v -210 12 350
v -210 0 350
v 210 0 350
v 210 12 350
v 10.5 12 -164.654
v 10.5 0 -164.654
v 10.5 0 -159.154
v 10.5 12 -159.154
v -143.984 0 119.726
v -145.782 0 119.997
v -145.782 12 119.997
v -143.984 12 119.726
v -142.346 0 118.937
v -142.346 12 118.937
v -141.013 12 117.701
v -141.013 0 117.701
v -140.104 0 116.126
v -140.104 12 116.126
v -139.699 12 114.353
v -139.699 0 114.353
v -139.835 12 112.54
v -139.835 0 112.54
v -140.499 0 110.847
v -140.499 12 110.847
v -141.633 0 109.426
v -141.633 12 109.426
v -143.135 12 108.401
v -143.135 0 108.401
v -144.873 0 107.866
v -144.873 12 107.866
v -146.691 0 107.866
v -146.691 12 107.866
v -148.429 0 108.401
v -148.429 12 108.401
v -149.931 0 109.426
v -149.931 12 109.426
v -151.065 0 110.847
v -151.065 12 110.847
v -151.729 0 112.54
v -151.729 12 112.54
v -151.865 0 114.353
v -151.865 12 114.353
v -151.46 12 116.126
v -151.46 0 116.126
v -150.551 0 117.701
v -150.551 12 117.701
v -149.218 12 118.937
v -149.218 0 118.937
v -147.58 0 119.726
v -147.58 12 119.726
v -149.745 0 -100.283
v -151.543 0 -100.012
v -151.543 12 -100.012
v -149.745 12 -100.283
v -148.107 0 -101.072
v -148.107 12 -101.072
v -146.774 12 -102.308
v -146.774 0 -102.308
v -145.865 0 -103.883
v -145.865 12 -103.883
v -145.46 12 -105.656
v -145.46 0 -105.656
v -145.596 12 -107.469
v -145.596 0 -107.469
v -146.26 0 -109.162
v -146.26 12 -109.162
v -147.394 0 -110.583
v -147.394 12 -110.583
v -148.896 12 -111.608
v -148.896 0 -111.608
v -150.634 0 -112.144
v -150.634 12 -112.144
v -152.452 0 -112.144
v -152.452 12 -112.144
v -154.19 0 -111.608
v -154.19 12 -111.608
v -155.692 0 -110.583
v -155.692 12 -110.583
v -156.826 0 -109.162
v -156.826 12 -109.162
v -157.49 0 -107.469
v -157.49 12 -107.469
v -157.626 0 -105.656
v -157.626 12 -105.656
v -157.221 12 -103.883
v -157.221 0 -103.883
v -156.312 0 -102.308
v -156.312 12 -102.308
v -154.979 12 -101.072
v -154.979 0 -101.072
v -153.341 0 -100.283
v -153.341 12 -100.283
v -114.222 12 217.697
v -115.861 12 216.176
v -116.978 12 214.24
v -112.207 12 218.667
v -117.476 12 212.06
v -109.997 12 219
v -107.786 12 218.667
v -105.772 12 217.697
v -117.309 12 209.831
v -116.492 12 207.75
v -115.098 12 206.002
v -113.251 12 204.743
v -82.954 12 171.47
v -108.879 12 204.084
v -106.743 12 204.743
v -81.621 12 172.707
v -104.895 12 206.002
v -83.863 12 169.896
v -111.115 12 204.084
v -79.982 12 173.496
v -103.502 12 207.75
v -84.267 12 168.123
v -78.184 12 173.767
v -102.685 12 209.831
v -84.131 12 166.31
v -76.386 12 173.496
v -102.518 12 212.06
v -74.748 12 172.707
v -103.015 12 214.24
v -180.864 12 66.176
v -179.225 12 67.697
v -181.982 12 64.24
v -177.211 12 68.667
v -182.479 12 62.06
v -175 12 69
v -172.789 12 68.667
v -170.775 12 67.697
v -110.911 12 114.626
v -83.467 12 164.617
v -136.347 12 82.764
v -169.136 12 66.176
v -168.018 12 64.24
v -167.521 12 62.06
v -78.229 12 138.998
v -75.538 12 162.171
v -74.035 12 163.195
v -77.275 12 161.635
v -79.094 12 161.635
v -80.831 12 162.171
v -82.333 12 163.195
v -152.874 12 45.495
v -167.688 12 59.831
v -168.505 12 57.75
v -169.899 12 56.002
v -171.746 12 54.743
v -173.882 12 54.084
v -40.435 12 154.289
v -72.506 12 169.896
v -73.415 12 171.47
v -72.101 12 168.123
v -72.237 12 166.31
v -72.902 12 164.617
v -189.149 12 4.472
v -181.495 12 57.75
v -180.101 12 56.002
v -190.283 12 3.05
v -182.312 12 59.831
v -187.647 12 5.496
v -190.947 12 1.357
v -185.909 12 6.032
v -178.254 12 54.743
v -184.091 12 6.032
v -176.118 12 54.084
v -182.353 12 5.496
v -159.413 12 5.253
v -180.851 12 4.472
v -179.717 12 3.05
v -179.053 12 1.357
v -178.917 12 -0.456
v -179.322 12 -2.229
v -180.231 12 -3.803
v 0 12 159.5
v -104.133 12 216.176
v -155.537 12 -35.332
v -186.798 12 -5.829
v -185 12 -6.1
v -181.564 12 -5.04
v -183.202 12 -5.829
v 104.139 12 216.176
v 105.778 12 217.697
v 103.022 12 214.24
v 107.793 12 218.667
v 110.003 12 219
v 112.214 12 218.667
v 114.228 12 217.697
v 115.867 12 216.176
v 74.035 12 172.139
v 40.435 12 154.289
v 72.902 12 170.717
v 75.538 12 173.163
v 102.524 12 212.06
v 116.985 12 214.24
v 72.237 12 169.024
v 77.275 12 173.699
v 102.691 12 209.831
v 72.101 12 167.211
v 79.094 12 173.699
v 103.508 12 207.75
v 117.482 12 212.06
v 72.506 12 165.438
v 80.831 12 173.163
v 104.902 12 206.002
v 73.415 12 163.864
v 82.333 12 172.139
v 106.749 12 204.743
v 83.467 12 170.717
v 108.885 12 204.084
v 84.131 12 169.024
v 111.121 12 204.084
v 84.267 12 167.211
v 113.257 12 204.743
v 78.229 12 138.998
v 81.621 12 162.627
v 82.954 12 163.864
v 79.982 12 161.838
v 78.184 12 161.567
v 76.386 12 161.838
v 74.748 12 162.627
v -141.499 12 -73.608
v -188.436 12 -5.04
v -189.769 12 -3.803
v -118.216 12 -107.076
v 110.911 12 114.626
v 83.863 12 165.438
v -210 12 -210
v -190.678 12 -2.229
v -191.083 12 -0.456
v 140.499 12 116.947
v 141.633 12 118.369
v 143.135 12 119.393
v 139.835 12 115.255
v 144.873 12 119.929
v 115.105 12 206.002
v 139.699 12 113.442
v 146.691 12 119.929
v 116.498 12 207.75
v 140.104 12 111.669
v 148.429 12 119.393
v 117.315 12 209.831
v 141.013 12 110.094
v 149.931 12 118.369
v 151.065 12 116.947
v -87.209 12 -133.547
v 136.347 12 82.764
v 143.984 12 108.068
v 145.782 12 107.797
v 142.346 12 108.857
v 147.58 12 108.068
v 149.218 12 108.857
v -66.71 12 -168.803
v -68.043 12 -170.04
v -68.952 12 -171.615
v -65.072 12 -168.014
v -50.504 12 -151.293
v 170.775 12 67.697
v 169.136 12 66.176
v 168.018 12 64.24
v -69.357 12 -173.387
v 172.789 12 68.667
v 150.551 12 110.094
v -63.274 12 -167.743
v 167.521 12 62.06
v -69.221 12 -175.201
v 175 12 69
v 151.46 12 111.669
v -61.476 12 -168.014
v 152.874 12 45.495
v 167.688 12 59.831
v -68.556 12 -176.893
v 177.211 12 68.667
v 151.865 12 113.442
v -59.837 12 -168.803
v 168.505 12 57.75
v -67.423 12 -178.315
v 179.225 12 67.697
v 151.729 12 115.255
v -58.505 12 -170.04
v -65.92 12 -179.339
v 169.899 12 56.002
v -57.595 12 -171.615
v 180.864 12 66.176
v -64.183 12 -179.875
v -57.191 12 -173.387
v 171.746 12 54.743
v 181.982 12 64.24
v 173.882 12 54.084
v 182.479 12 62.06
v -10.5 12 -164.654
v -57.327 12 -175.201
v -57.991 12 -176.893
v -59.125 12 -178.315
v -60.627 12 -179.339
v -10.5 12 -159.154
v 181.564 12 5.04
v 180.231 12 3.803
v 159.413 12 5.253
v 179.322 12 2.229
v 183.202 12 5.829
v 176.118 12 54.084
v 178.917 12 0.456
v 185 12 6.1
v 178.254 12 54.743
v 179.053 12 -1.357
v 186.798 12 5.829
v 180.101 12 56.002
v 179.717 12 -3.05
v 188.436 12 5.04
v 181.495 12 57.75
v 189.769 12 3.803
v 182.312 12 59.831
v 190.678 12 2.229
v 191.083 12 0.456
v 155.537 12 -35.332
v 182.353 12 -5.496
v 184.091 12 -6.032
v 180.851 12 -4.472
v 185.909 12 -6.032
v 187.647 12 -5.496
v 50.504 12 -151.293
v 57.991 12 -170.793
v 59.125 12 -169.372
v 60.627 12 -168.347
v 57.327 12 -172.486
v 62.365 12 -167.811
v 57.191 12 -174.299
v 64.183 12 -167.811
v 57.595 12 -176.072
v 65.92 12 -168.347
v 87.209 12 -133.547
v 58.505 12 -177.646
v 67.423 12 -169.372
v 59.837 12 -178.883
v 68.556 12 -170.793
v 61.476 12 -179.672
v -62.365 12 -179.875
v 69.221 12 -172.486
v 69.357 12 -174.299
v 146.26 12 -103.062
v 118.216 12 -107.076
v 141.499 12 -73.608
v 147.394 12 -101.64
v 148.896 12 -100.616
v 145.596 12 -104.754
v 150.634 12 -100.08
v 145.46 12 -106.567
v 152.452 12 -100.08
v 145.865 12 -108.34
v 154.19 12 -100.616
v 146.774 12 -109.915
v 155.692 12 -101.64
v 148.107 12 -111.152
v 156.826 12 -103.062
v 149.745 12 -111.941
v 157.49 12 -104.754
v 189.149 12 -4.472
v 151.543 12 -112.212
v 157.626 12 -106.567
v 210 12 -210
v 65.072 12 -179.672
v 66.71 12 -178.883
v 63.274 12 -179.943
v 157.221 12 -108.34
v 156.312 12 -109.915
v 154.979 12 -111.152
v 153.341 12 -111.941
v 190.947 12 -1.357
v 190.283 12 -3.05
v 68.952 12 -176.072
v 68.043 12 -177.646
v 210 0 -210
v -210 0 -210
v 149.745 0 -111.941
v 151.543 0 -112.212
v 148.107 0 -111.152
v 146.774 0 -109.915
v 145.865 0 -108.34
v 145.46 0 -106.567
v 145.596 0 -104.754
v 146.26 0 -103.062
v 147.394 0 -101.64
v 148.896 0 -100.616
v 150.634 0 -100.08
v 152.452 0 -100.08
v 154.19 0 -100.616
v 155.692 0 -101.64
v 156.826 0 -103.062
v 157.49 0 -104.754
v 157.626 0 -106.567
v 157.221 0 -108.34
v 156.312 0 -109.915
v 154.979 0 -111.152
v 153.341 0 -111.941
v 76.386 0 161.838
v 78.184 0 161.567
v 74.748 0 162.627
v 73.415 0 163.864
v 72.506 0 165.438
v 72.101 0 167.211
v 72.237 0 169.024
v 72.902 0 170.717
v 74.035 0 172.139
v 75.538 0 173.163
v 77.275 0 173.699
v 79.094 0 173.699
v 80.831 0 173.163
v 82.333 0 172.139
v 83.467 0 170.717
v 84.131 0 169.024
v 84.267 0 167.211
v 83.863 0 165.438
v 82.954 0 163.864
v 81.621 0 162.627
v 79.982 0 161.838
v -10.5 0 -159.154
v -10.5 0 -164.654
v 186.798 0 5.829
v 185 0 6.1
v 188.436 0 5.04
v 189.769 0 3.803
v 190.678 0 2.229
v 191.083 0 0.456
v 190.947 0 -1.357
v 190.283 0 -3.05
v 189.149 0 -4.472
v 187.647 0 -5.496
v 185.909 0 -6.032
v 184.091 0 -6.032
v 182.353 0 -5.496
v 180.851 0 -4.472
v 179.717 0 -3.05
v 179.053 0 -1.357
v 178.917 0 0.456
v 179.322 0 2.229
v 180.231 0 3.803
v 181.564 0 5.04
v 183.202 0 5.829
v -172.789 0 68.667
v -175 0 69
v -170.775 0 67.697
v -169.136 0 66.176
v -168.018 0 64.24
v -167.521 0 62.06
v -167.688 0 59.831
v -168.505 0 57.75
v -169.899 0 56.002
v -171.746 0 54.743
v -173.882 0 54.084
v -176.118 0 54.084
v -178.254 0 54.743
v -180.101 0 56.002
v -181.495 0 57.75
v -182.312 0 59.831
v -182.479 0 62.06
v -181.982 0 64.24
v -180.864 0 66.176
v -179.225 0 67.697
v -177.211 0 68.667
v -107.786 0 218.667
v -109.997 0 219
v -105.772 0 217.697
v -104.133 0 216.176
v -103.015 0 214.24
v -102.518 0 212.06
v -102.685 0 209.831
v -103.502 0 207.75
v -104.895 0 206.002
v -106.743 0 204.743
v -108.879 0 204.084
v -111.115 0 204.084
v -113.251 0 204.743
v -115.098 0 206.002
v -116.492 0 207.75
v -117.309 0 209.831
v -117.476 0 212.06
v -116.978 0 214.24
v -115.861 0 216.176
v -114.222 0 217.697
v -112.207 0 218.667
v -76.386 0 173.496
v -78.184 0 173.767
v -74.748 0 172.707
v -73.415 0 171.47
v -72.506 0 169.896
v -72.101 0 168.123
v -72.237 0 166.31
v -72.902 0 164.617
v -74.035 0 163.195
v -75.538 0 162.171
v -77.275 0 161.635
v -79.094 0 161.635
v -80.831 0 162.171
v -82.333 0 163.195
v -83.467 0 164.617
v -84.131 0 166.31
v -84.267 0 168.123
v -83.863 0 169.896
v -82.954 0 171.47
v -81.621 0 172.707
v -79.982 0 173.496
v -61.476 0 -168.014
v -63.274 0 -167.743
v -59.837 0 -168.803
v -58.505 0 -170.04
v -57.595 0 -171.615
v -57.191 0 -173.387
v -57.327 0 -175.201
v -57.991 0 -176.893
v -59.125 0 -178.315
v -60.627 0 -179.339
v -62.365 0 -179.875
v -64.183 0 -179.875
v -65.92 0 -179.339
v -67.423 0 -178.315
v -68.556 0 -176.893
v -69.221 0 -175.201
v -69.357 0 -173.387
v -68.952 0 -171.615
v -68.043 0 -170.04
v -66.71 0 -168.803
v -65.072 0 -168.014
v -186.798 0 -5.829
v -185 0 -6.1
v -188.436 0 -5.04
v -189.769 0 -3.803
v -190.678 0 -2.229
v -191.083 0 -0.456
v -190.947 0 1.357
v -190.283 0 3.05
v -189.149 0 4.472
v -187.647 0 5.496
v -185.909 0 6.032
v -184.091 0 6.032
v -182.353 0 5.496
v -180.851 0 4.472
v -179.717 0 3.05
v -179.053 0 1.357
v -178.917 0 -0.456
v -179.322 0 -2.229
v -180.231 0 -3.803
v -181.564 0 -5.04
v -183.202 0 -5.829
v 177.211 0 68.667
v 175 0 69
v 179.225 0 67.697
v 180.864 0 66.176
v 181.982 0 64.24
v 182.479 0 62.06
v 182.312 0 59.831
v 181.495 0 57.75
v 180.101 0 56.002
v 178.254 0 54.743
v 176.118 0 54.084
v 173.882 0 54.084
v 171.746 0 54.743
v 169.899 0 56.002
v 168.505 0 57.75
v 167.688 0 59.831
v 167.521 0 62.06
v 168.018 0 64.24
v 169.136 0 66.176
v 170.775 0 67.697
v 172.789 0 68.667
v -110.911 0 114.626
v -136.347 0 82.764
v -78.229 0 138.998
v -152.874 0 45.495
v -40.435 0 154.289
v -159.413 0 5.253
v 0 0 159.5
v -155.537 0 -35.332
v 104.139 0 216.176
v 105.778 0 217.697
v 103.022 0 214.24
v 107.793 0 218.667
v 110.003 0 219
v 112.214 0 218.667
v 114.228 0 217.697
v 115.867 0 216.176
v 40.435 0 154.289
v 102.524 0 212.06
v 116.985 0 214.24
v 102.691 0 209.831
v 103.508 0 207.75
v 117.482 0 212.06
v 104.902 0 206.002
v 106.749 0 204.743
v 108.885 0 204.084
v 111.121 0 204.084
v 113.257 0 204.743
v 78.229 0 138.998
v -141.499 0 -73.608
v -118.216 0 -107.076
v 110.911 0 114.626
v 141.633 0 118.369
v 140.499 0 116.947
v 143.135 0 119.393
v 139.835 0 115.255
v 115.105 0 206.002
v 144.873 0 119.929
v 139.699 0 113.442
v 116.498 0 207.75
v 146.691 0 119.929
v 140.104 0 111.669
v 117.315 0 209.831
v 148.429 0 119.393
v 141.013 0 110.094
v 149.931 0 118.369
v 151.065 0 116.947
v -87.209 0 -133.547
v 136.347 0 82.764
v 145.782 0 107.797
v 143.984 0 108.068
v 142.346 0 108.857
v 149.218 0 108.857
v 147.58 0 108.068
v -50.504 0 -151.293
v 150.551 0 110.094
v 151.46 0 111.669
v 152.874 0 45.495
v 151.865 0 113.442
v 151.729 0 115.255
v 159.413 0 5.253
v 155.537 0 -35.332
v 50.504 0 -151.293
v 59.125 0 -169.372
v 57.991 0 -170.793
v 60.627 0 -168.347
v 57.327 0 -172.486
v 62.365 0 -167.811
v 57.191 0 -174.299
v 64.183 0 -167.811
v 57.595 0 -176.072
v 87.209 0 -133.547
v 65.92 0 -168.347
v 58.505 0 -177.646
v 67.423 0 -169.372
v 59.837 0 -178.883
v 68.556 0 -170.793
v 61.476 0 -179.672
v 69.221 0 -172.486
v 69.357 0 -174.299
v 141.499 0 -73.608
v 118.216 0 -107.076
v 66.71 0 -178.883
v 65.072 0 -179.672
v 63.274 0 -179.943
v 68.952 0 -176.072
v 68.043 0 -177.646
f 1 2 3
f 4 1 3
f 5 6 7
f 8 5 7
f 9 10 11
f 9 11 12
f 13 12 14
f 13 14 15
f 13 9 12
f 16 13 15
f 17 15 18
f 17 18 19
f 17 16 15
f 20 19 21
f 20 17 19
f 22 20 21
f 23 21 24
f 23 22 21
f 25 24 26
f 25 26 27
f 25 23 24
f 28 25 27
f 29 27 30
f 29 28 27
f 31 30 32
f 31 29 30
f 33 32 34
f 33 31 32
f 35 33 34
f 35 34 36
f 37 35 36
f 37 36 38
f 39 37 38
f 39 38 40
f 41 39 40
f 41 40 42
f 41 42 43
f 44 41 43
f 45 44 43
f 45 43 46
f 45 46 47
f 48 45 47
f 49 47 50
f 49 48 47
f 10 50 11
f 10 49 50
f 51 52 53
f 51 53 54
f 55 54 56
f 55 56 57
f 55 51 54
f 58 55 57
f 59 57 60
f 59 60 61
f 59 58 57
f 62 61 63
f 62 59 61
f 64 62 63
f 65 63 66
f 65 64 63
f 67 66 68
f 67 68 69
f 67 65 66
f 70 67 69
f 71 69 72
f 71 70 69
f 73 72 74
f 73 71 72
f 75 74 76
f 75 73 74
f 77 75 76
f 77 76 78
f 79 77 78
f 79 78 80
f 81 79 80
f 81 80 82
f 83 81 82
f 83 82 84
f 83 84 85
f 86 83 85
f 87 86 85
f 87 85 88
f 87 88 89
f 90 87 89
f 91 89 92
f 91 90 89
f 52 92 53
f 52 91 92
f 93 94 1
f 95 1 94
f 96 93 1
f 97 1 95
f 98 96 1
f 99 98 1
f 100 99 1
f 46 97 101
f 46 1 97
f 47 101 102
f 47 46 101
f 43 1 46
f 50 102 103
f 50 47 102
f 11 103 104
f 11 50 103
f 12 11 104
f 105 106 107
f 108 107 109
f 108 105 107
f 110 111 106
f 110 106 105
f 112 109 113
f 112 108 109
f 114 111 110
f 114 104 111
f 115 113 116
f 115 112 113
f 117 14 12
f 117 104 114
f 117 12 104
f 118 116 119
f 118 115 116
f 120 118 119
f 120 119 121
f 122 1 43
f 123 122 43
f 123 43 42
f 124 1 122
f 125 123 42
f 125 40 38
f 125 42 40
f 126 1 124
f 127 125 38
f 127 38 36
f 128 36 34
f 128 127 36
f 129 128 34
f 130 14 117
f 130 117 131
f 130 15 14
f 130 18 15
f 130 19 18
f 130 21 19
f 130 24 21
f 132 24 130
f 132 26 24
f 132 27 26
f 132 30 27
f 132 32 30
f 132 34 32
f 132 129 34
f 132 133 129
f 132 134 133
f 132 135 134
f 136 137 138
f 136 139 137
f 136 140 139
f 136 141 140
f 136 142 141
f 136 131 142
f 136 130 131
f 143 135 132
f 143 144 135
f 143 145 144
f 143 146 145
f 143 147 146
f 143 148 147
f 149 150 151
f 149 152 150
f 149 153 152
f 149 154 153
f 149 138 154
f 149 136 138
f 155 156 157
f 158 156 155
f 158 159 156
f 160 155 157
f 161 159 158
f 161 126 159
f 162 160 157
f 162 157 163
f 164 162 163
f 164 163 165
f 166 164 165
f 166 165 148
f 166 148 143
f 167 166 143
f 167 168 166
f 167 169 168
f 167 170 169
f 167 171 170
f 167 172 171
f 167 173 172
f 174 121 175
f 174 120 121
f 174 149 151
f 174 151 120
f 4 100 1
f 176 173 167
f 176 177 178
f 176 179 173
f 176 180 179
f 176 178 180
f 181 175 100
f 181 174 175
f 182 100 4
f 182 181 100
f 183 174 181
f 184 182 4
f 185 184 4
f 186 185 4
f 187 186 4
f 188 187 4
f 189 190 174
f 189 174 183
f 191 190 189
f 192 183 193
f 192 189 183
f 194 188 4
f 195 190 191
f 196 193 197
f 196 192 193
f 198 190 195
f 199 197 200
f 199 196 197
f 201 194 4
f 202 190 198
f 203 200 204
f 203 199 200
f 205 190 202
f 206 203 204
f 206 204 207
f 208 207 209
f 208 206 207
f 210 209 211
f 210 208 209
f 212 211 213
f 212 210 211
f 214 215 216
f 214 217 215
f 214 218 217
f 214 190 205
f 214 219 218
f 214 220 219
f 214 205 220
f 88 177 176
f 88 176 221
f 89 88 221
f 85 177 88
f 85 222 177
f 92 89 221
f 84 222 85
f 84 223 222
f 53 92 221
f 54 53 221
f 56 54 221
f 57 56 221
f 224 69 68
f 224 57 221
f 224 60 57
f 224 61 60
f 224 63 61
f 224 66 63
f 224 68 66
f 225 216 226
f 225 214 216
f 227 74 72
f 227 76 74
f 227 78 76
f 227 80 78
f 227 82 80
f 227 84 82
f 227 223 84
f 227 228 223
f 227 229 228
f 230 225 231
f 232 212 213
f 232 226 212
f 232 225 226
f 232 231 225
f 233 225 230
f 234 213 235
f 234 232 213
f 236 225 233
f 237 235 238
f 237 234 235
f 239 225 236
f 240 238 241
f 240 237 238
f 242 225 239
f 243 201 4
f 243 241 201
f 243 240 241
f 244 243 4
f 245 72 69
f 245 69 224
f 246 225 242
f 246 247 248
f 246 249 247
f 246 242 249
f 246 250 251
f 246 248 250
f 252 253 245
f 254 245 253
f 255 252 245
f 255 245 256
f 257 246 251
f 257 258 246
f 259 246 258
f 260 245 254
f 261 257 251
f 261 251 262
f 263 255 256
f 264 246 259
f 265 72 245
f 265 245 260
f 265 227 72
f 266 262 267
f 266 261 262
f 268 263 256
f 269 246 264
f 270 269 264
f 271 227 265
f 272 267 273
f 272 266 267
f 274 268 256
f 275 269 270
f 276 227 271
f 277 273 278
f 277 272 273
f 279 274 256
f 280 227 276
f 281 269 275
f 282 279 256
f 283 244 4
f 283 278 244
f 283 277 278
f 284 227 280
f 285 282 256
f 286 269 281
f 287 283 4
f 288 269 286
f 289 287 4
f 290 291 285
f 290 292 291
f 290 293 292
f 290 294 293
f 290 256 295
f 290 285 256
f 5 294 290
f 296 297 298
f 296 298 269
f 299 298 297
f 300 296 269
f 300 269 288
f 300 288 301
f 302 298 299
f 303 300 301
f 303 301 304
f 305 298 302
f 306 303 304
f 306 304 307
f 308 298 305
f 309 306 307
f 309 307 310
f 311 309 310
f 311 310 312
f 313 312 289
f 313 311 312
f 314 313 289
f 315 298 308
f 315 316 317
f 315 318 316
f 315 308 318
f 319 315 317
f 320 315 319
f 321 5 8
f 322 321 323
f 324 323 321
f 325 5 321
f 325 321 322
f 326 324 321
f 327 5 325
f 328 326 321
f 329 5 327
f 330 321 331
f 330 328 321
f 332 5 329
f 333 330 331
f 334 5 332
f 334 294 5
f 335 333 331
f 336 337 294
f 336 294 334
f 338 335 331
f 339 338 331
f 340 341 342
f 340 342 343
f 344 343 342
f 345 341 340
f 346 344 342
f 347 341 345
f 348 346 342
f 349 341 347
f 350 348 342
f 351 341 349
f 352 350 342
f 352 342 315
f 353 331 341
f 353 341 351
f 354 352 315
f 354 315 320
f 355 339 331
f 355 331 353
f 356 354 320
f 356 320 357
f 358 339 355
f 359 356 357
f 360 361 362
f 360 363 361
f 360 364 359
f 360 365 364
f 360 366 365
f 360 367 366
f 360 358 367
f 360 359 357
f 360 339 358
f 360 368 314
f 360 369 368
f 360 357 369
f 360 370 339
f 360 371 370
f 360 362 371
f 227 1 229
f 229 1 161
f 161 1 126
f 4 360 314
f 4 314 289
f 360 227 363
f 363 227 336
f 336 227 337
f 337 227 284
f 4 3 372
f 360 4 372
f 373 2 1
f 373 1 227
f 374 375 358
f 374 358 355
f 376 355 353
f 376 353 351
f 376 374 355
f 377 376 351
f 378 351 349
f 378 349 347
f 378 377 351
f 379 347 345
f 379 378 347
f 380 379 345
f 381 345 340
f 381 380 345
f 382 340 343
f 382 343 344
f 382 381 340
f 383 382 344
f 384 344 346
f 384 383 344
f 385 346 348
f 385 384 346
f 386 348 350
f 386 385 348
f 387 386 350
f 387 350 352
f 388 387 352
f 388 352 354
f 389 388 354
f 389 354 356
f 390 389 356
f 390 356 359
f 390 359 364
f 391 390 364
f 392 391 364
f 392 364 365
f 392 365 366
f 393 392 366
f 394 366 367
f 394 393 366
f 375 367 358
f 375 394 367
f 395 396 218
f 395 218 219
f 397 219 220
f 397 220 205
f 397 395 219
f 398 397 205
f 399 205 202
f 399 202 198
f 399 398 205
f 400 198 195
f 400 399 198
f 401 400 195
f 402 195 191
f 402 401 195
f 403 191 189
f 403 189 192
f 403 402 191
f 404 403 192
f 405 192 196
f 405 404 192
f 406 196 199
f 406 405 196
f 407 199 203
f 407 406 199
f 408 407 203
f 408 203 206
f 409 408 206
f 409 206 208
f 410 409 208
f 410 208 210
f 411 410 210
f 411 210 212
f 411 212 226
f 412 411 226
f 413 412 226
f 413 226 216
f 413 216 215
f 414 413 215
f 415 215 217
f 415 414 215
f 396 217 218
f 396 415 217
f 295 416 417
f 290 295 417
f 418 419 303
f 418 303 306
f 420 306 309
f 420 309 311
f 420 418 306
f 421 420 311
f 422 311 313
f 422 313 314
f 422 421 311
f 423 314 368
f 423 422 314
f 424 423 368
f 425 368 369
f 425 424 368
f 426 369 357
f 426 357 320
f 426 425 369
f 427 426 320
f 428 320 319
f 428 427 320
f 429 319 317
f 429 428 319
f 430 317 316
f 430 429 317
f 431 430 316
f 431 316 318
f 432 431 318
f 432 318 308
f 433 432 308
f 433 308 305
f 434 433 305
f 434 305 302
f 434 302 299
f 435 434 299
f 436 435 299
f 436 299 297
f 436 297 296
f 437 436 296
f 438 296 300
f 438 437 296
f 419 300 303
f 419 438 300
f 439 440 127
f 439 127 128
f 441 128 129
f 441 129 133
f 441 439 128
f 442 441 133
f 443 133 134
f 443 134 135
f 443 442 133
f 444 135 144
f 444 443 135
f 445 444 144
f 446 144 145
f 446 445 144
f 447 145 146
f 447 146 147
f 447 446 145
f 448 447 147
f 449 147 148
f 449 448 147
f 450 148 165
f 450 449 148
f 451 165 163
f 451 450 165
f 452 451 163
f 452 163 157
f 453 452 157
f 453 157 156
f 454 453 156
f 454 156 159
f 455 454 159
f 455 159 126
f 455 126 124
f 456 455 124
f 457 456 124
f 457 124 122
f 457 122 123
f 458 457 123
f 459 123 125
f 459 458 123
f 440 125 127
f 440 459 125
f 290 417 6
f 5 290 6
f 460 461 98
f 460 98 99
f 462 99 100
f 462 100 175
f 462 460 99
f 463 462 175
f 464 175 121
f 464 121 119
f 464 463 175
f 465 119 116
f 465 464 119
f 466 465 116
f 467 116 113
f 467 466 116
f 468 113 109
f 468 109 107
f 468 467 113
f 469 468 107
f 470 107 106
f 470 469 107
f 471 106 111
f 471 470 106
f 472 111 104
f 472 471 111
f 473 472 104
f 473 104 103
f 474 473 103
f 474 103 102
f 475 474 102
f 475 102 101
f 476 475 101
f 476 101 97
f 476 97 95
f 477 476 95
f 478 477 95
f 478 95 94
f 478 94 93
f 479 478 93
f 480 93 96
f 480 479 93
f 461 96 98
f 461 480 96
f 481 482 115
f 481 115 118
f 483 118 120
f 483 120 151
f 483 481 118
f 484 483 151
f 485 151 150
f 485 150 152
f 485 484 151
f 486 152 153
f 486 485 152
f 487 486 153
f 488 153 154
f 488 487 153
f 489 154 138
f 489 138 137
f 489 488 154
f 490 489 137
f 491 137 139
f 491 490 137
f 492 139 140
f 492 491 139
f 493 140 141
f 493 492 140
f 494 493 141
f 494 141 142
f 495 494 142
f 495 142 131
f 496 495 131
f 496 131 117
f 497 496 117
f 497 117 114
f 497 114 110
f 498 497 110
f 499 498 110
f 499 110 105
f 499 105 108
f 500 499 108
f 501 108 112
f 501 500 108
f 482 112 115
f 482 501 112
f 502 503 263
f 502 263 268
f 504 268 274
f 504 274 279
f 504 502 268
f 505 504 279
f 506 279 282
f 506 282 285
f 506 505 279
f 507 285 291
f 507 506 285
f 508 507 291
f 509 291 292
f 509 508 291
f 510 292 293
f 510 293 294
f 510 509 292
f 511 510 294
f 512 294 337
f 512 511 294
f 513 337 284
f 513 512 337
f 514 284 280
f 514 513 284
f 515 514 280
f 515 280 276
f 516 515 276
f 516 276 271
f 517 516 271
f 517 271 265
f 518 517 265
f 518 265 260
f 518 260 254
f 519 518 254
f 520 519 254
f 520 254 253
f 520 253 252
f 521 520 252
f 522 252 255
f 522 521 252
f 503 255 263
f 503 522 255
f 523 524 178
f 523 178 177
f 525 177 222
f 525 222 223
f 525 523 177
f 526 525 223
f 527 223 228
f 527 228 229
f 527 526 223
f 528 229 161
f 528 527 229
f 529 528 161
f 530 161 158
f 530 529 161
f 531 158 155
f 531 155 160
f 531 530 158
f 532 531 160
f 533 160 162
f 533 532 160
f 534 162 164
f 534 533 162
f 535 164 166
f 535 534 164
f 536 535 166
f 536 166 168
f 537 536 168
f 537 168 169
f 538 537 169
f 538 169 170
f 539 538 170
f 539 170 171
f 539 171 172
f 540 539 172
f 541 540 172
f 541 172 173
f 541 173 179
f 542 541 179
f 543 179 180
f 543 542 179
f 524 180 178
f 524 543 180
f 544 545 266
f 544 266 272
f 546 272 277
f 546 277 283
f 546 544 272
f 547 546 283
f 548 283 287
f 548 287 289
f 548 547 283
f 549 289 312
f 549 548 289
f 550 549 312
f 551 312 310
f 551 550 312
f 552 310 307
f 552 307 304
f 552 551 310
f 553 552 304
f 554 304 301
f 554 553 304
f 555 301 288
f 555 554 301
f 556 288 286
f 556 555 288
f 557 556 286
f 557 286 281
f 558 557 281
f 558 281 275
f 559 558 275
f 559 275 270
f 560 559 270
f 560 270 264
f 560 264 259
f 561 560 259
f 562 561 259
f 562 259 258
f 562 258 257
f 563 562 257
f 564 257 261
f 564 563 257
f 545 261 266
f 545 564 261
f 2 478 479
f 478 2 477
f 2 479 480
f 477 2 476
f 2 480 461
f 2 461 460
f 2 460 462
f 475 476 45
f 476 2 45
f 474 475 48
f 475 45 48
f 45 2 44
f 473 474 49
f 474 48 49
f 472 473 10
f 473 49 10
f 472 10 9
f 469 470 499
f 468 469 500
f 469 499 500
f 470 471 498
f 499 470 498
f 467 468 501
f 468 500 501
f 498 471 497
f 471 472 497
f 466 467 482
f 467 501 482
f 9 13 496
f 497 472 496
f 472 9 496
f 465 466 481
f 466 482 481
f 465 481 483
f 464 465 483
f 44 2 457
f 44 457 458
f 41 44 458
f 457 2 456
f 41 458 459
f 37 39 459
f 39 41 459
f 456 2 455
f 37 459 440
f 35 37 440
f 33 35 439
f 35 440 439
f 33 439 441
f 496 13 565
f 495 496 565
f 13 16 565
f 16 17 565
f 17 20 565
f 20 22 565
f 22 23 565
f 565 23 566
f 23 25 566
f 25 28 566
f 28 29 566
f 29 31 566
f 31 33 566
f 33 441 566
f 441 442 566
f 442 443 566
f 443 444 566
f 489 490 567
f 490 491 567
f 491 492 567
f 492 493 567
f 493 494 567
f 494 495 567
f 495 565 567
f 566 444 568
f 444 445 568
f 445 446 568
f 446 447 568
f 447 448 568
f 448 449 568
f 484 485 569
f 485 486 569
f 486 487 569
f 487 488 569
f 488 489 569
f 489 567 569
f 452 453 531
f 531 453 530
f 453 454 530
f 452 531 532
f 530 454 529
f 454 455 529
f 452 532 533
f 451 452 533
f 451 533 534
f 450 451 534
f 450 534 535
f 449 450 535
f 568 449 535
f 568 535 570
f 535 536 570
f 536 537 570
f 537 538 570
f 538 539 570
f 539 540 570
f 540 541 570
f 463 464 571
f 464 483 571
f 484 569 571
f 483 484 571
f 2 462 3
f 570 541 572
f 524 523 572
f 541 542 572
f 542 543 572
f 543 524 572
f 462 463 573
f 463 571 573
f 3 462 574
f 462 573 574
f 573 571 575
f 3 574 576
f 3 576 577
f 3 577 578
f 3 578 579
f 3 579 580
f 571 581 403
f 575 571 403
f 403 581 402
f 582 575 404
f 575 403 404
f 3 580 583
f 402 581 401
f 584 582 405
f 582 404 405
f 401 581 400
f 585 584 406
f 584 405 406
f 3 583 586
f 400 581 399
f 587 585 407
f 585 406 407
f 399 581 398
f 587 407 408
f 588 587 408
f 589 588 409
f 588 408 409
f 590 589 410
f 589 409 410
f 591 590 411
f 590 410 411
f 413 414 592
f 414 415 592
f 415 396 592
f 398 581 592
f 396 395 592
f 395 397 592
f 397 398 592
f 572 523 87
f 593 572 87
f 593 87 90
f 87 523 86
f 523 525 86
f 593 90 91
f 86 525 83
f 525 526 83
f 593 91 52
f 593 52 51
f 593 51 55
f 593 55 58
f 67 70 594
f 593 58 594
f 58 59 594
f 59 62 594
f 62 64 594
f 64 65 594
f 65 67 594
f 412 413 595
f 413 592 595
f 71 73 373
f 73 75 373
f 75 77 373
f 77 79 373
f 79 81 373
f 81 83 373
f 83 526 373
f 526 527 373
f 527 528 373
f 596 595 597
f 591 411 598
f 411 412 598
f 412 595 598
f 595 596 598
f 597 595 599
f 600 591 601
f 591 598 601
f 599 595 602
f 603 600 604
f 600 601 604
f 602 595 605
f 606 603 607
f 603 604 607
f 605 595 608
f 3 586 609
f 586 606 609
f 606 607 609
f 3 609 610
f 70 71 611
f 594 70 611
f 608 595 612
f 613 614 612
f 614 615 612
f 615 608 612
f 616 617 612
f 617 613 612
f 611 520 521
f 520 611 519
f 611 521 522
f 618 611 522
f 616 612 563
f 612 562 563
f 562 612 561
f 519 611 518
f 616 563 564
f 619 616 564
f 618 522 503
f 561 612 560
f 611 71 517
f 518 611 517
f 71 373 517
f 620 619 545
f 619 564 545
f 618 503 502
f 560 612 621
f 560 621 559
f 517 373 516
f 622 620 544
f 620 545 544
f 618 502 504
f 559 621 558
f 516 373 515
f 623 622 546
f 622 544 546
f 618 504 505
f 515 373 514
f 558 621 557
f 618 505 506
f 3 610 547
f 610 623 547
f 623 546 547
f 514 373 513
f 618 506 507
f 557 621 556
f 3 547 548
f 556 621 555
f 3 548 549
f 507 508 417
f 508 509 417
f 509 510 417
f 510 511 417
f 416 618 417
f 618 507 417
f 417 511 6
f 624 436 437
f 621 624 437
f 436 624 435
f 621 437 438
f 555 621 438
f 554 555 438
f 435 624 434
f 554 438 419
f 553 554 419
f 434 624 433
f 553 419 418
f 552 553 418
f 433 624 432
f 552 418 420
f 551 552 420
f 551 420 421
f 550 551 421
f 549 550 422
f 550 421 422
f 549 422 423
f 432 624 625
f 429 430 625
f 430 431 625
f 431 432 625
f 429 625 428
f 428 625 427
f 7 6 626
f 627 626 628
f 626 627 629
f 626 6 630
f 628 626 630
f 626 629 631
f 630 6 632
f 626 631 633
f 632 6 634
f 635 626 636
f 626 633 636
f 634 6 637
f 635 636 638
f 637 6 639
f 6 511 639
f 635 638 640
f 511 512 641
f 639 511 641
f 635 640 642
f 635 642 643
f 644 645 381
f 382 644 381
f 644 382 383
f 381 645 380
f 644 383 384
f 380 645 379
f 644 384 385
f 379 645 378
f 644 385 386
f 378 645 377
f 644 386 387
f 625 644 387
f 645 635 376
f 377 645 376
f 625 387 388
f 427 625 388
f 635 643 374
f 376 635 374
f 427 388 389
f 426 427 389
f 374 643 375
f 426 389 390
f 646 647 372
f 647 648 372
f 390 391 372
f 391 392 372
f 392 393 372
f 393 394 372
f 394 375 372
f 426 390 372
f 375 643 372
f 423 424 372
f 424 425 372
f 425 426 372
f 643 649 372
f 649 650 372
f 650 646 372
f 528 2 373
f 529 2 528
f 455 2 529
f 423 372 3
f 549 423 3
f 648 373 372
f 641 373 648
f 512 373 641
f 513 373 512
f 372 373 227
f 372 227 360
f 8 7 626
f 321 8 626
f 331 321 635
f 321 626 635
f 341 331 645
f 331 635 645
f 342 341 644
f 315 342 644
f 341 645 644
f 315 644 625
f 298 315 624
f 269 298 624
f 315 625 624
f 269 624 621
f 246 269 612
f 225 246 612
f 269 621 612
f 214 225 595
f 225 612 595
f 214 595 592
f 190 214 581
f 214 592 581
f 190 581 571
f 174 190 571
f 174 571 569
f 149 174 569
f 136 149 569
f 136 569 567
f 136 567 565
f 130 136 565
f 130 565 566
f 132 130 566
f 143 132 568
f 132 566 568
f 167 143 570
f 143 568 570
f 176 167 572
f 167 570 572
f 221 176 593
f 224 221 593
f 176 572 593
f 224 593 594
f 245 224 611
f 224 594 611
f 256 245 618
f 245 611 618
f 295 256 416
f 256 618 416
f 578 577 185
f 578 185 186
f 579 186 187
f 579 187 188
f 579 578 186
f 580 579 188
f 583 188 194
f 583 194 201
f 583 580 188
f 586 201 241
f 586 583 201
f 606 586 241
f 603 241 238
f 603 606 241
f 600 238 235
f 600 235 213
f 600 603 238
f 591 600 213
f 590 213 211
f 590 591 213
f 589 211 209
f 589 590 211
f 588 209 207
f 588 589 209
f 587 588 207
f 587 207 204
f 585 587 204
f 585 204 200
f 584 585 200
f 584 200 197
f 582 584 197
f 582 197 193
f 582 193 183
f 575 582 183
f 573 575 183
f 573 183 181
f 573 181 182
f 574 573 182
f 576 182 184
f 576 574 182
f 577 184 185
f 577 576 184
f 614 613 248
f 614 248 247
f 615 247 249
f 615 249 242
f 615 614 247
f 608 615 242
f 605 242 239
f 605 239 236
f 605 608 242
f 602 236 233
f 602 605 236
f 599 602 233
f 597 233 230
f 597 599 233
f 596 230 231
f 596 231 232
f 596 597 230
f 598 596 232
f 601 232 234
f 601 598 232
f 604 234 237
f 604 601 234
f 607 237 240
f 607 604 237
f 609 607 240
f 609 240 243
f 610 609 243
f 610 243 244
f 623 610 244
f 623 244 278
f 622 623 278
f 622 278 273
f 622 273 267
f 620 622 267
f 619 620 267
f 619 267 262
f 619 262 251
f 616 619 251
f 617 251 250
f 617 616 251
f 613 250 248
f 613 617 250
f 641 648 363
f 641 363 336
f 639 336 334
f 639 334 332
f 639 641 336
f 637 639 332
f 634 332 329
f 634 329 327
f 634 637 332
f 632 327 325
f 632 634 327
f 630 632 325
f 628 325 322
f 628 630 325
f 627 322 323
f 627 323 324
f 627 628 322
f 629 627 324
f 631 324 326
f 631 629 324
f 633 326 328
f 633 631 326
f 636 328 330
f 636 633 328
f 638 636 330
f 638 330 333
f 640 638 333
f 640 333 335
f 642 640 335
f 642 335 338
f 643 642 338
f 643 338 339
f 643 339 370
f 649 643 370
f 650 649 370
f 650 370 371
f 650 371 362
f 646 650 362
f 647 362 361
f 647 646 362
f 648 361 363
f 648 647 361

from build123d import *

# Parameters (mm, degrees)
ESQUISSE1_W        = 420
ESQUISSE1_H        = 560
ESQUISSE1_R        = 6.1
ESQUISSE1_R_2      = 7.5
BOSS_EXTRU_1_DEPTH = 12


with BuildPart() as part:
    # Esquisse1 → Boss.-Extru.1 (new body)
    with BuildSketch(Plane(origin=(0, 0, 0), x_dir=(1, 0, 0), z_dir=(0, 1, 0))):
        with Locations((0, -70)):
            Rectangle(ESQUISSE1_W, ESQUISSE1_H)
        with Locations(Location((-63.273726515, 173.843134845, 0), (0, 0, 270))):  # turned: the seam where the file's is
            Circle(ESQUISSE1_R, mode=Mode.SUBTRACT)
        with Locations(Location((-175, -61.5, 0), (0, 0, 270))):  # turned: the seam where the file's is
            Circle(ESQUISSE1_R_2, mode=Mode.SUBTRACT)
        with Locations(Location((110.0032143, -211.5, 0), (0, 0, 270))):  # turned: the seam where the file's is
            Circle(ESQUISSE1_R_2, mode=Mode.SUBTRACT)
        with Locations(Location((175, -61.5, 0), (0, 0, 270))):  # turned: the seam where the file's is
            Circle(ESQUISSE1_R_2, mode=Mode.SUBTRACT)
        with Locations(Location((185, 0, 0), (0, 0, 270))):  # turned: the seam where the file's is
            Circle(ESQUISSE1_R, mode=Mode.SUBTRACT)
        with Locations(Location((-109.9967857, -211.5, 0), (0, 0, 270))):  # turned: the seam where the file's is
            Circle(ESQUISSE1_R_2, mode=Mode.SUBTRACT)
        with Locations(Location((151.543128193, 106.111640725, 0), (0, 0, 90))):  # turned: the seam where the file's is
            Circle(ESQUISSE1_R, mode=Mode.SUBTRACT)
        with Locations(Location((-151.543128193, 106.111640725, 0), (0, 0, 270))):  # turned: the seam where the file's is
            Circle(ESQUISSE1_R, mode=Mode.SUBTRACT)
        with Locations(Location((-185, 0, 0), (0, 0, 90))):  # turned: the seam where the file's is
            Circle(ESQUISSE1_R, mode=Mode.SUBTRACT)
        with Locations(Location((63.273726515, 173.843134845, 0), (0, 0, 90))):  # turned: the seam where the file's is
            Circle(ESQUISSE1_R, mode=Mode.SUBTRACT)
        with Locations(Location((-145.781989417, -113.897372935, 0), (0, 0, 270))):  # turned: the seam where the file's is
            Circle(ESQUISSE1_R, mode=Mode.SUBTRACT)
        with Locations(Location((-78.184378422, -167.666940602, 0), (0, 0, 270))):  # turned: the seam where the file's is
            Circle(ESQUISSE1_R, mode=Mode.SUBTRACT)
        with Locations(Location((145.781989417, -113.897372935, 0), (0, 0, 90))):  # turned: the seam where the file's is
            Circle(ESQUISSE1_R, mode=Mode.SUBTRACT)
        with Locations(Location((78.184378422, -167.666940602, 0), (0, 0, 90))):  # turned: the seam where the file's is
            Circle(ESQUISSE1_R, mode=Mode.SUBTRACT)
        with BuildLine():
            Line((10.5, 164.654013459), (10.5, 159.154013459))
            ThreePointArc((10.5, 159.154013459), (0, -159.5), (-10.5, 159.154013459))
            Line((-10.5, 159.154013459), (-10.5, 164.654013459))
            Line((-10.5, 164.654013459), (10.5, 164.654013459))
        make_face(mode=Mode.SUBTRACT)
    extrude(amount=BOSS_EXTRU_1_DEPTH)


solid = part.part
